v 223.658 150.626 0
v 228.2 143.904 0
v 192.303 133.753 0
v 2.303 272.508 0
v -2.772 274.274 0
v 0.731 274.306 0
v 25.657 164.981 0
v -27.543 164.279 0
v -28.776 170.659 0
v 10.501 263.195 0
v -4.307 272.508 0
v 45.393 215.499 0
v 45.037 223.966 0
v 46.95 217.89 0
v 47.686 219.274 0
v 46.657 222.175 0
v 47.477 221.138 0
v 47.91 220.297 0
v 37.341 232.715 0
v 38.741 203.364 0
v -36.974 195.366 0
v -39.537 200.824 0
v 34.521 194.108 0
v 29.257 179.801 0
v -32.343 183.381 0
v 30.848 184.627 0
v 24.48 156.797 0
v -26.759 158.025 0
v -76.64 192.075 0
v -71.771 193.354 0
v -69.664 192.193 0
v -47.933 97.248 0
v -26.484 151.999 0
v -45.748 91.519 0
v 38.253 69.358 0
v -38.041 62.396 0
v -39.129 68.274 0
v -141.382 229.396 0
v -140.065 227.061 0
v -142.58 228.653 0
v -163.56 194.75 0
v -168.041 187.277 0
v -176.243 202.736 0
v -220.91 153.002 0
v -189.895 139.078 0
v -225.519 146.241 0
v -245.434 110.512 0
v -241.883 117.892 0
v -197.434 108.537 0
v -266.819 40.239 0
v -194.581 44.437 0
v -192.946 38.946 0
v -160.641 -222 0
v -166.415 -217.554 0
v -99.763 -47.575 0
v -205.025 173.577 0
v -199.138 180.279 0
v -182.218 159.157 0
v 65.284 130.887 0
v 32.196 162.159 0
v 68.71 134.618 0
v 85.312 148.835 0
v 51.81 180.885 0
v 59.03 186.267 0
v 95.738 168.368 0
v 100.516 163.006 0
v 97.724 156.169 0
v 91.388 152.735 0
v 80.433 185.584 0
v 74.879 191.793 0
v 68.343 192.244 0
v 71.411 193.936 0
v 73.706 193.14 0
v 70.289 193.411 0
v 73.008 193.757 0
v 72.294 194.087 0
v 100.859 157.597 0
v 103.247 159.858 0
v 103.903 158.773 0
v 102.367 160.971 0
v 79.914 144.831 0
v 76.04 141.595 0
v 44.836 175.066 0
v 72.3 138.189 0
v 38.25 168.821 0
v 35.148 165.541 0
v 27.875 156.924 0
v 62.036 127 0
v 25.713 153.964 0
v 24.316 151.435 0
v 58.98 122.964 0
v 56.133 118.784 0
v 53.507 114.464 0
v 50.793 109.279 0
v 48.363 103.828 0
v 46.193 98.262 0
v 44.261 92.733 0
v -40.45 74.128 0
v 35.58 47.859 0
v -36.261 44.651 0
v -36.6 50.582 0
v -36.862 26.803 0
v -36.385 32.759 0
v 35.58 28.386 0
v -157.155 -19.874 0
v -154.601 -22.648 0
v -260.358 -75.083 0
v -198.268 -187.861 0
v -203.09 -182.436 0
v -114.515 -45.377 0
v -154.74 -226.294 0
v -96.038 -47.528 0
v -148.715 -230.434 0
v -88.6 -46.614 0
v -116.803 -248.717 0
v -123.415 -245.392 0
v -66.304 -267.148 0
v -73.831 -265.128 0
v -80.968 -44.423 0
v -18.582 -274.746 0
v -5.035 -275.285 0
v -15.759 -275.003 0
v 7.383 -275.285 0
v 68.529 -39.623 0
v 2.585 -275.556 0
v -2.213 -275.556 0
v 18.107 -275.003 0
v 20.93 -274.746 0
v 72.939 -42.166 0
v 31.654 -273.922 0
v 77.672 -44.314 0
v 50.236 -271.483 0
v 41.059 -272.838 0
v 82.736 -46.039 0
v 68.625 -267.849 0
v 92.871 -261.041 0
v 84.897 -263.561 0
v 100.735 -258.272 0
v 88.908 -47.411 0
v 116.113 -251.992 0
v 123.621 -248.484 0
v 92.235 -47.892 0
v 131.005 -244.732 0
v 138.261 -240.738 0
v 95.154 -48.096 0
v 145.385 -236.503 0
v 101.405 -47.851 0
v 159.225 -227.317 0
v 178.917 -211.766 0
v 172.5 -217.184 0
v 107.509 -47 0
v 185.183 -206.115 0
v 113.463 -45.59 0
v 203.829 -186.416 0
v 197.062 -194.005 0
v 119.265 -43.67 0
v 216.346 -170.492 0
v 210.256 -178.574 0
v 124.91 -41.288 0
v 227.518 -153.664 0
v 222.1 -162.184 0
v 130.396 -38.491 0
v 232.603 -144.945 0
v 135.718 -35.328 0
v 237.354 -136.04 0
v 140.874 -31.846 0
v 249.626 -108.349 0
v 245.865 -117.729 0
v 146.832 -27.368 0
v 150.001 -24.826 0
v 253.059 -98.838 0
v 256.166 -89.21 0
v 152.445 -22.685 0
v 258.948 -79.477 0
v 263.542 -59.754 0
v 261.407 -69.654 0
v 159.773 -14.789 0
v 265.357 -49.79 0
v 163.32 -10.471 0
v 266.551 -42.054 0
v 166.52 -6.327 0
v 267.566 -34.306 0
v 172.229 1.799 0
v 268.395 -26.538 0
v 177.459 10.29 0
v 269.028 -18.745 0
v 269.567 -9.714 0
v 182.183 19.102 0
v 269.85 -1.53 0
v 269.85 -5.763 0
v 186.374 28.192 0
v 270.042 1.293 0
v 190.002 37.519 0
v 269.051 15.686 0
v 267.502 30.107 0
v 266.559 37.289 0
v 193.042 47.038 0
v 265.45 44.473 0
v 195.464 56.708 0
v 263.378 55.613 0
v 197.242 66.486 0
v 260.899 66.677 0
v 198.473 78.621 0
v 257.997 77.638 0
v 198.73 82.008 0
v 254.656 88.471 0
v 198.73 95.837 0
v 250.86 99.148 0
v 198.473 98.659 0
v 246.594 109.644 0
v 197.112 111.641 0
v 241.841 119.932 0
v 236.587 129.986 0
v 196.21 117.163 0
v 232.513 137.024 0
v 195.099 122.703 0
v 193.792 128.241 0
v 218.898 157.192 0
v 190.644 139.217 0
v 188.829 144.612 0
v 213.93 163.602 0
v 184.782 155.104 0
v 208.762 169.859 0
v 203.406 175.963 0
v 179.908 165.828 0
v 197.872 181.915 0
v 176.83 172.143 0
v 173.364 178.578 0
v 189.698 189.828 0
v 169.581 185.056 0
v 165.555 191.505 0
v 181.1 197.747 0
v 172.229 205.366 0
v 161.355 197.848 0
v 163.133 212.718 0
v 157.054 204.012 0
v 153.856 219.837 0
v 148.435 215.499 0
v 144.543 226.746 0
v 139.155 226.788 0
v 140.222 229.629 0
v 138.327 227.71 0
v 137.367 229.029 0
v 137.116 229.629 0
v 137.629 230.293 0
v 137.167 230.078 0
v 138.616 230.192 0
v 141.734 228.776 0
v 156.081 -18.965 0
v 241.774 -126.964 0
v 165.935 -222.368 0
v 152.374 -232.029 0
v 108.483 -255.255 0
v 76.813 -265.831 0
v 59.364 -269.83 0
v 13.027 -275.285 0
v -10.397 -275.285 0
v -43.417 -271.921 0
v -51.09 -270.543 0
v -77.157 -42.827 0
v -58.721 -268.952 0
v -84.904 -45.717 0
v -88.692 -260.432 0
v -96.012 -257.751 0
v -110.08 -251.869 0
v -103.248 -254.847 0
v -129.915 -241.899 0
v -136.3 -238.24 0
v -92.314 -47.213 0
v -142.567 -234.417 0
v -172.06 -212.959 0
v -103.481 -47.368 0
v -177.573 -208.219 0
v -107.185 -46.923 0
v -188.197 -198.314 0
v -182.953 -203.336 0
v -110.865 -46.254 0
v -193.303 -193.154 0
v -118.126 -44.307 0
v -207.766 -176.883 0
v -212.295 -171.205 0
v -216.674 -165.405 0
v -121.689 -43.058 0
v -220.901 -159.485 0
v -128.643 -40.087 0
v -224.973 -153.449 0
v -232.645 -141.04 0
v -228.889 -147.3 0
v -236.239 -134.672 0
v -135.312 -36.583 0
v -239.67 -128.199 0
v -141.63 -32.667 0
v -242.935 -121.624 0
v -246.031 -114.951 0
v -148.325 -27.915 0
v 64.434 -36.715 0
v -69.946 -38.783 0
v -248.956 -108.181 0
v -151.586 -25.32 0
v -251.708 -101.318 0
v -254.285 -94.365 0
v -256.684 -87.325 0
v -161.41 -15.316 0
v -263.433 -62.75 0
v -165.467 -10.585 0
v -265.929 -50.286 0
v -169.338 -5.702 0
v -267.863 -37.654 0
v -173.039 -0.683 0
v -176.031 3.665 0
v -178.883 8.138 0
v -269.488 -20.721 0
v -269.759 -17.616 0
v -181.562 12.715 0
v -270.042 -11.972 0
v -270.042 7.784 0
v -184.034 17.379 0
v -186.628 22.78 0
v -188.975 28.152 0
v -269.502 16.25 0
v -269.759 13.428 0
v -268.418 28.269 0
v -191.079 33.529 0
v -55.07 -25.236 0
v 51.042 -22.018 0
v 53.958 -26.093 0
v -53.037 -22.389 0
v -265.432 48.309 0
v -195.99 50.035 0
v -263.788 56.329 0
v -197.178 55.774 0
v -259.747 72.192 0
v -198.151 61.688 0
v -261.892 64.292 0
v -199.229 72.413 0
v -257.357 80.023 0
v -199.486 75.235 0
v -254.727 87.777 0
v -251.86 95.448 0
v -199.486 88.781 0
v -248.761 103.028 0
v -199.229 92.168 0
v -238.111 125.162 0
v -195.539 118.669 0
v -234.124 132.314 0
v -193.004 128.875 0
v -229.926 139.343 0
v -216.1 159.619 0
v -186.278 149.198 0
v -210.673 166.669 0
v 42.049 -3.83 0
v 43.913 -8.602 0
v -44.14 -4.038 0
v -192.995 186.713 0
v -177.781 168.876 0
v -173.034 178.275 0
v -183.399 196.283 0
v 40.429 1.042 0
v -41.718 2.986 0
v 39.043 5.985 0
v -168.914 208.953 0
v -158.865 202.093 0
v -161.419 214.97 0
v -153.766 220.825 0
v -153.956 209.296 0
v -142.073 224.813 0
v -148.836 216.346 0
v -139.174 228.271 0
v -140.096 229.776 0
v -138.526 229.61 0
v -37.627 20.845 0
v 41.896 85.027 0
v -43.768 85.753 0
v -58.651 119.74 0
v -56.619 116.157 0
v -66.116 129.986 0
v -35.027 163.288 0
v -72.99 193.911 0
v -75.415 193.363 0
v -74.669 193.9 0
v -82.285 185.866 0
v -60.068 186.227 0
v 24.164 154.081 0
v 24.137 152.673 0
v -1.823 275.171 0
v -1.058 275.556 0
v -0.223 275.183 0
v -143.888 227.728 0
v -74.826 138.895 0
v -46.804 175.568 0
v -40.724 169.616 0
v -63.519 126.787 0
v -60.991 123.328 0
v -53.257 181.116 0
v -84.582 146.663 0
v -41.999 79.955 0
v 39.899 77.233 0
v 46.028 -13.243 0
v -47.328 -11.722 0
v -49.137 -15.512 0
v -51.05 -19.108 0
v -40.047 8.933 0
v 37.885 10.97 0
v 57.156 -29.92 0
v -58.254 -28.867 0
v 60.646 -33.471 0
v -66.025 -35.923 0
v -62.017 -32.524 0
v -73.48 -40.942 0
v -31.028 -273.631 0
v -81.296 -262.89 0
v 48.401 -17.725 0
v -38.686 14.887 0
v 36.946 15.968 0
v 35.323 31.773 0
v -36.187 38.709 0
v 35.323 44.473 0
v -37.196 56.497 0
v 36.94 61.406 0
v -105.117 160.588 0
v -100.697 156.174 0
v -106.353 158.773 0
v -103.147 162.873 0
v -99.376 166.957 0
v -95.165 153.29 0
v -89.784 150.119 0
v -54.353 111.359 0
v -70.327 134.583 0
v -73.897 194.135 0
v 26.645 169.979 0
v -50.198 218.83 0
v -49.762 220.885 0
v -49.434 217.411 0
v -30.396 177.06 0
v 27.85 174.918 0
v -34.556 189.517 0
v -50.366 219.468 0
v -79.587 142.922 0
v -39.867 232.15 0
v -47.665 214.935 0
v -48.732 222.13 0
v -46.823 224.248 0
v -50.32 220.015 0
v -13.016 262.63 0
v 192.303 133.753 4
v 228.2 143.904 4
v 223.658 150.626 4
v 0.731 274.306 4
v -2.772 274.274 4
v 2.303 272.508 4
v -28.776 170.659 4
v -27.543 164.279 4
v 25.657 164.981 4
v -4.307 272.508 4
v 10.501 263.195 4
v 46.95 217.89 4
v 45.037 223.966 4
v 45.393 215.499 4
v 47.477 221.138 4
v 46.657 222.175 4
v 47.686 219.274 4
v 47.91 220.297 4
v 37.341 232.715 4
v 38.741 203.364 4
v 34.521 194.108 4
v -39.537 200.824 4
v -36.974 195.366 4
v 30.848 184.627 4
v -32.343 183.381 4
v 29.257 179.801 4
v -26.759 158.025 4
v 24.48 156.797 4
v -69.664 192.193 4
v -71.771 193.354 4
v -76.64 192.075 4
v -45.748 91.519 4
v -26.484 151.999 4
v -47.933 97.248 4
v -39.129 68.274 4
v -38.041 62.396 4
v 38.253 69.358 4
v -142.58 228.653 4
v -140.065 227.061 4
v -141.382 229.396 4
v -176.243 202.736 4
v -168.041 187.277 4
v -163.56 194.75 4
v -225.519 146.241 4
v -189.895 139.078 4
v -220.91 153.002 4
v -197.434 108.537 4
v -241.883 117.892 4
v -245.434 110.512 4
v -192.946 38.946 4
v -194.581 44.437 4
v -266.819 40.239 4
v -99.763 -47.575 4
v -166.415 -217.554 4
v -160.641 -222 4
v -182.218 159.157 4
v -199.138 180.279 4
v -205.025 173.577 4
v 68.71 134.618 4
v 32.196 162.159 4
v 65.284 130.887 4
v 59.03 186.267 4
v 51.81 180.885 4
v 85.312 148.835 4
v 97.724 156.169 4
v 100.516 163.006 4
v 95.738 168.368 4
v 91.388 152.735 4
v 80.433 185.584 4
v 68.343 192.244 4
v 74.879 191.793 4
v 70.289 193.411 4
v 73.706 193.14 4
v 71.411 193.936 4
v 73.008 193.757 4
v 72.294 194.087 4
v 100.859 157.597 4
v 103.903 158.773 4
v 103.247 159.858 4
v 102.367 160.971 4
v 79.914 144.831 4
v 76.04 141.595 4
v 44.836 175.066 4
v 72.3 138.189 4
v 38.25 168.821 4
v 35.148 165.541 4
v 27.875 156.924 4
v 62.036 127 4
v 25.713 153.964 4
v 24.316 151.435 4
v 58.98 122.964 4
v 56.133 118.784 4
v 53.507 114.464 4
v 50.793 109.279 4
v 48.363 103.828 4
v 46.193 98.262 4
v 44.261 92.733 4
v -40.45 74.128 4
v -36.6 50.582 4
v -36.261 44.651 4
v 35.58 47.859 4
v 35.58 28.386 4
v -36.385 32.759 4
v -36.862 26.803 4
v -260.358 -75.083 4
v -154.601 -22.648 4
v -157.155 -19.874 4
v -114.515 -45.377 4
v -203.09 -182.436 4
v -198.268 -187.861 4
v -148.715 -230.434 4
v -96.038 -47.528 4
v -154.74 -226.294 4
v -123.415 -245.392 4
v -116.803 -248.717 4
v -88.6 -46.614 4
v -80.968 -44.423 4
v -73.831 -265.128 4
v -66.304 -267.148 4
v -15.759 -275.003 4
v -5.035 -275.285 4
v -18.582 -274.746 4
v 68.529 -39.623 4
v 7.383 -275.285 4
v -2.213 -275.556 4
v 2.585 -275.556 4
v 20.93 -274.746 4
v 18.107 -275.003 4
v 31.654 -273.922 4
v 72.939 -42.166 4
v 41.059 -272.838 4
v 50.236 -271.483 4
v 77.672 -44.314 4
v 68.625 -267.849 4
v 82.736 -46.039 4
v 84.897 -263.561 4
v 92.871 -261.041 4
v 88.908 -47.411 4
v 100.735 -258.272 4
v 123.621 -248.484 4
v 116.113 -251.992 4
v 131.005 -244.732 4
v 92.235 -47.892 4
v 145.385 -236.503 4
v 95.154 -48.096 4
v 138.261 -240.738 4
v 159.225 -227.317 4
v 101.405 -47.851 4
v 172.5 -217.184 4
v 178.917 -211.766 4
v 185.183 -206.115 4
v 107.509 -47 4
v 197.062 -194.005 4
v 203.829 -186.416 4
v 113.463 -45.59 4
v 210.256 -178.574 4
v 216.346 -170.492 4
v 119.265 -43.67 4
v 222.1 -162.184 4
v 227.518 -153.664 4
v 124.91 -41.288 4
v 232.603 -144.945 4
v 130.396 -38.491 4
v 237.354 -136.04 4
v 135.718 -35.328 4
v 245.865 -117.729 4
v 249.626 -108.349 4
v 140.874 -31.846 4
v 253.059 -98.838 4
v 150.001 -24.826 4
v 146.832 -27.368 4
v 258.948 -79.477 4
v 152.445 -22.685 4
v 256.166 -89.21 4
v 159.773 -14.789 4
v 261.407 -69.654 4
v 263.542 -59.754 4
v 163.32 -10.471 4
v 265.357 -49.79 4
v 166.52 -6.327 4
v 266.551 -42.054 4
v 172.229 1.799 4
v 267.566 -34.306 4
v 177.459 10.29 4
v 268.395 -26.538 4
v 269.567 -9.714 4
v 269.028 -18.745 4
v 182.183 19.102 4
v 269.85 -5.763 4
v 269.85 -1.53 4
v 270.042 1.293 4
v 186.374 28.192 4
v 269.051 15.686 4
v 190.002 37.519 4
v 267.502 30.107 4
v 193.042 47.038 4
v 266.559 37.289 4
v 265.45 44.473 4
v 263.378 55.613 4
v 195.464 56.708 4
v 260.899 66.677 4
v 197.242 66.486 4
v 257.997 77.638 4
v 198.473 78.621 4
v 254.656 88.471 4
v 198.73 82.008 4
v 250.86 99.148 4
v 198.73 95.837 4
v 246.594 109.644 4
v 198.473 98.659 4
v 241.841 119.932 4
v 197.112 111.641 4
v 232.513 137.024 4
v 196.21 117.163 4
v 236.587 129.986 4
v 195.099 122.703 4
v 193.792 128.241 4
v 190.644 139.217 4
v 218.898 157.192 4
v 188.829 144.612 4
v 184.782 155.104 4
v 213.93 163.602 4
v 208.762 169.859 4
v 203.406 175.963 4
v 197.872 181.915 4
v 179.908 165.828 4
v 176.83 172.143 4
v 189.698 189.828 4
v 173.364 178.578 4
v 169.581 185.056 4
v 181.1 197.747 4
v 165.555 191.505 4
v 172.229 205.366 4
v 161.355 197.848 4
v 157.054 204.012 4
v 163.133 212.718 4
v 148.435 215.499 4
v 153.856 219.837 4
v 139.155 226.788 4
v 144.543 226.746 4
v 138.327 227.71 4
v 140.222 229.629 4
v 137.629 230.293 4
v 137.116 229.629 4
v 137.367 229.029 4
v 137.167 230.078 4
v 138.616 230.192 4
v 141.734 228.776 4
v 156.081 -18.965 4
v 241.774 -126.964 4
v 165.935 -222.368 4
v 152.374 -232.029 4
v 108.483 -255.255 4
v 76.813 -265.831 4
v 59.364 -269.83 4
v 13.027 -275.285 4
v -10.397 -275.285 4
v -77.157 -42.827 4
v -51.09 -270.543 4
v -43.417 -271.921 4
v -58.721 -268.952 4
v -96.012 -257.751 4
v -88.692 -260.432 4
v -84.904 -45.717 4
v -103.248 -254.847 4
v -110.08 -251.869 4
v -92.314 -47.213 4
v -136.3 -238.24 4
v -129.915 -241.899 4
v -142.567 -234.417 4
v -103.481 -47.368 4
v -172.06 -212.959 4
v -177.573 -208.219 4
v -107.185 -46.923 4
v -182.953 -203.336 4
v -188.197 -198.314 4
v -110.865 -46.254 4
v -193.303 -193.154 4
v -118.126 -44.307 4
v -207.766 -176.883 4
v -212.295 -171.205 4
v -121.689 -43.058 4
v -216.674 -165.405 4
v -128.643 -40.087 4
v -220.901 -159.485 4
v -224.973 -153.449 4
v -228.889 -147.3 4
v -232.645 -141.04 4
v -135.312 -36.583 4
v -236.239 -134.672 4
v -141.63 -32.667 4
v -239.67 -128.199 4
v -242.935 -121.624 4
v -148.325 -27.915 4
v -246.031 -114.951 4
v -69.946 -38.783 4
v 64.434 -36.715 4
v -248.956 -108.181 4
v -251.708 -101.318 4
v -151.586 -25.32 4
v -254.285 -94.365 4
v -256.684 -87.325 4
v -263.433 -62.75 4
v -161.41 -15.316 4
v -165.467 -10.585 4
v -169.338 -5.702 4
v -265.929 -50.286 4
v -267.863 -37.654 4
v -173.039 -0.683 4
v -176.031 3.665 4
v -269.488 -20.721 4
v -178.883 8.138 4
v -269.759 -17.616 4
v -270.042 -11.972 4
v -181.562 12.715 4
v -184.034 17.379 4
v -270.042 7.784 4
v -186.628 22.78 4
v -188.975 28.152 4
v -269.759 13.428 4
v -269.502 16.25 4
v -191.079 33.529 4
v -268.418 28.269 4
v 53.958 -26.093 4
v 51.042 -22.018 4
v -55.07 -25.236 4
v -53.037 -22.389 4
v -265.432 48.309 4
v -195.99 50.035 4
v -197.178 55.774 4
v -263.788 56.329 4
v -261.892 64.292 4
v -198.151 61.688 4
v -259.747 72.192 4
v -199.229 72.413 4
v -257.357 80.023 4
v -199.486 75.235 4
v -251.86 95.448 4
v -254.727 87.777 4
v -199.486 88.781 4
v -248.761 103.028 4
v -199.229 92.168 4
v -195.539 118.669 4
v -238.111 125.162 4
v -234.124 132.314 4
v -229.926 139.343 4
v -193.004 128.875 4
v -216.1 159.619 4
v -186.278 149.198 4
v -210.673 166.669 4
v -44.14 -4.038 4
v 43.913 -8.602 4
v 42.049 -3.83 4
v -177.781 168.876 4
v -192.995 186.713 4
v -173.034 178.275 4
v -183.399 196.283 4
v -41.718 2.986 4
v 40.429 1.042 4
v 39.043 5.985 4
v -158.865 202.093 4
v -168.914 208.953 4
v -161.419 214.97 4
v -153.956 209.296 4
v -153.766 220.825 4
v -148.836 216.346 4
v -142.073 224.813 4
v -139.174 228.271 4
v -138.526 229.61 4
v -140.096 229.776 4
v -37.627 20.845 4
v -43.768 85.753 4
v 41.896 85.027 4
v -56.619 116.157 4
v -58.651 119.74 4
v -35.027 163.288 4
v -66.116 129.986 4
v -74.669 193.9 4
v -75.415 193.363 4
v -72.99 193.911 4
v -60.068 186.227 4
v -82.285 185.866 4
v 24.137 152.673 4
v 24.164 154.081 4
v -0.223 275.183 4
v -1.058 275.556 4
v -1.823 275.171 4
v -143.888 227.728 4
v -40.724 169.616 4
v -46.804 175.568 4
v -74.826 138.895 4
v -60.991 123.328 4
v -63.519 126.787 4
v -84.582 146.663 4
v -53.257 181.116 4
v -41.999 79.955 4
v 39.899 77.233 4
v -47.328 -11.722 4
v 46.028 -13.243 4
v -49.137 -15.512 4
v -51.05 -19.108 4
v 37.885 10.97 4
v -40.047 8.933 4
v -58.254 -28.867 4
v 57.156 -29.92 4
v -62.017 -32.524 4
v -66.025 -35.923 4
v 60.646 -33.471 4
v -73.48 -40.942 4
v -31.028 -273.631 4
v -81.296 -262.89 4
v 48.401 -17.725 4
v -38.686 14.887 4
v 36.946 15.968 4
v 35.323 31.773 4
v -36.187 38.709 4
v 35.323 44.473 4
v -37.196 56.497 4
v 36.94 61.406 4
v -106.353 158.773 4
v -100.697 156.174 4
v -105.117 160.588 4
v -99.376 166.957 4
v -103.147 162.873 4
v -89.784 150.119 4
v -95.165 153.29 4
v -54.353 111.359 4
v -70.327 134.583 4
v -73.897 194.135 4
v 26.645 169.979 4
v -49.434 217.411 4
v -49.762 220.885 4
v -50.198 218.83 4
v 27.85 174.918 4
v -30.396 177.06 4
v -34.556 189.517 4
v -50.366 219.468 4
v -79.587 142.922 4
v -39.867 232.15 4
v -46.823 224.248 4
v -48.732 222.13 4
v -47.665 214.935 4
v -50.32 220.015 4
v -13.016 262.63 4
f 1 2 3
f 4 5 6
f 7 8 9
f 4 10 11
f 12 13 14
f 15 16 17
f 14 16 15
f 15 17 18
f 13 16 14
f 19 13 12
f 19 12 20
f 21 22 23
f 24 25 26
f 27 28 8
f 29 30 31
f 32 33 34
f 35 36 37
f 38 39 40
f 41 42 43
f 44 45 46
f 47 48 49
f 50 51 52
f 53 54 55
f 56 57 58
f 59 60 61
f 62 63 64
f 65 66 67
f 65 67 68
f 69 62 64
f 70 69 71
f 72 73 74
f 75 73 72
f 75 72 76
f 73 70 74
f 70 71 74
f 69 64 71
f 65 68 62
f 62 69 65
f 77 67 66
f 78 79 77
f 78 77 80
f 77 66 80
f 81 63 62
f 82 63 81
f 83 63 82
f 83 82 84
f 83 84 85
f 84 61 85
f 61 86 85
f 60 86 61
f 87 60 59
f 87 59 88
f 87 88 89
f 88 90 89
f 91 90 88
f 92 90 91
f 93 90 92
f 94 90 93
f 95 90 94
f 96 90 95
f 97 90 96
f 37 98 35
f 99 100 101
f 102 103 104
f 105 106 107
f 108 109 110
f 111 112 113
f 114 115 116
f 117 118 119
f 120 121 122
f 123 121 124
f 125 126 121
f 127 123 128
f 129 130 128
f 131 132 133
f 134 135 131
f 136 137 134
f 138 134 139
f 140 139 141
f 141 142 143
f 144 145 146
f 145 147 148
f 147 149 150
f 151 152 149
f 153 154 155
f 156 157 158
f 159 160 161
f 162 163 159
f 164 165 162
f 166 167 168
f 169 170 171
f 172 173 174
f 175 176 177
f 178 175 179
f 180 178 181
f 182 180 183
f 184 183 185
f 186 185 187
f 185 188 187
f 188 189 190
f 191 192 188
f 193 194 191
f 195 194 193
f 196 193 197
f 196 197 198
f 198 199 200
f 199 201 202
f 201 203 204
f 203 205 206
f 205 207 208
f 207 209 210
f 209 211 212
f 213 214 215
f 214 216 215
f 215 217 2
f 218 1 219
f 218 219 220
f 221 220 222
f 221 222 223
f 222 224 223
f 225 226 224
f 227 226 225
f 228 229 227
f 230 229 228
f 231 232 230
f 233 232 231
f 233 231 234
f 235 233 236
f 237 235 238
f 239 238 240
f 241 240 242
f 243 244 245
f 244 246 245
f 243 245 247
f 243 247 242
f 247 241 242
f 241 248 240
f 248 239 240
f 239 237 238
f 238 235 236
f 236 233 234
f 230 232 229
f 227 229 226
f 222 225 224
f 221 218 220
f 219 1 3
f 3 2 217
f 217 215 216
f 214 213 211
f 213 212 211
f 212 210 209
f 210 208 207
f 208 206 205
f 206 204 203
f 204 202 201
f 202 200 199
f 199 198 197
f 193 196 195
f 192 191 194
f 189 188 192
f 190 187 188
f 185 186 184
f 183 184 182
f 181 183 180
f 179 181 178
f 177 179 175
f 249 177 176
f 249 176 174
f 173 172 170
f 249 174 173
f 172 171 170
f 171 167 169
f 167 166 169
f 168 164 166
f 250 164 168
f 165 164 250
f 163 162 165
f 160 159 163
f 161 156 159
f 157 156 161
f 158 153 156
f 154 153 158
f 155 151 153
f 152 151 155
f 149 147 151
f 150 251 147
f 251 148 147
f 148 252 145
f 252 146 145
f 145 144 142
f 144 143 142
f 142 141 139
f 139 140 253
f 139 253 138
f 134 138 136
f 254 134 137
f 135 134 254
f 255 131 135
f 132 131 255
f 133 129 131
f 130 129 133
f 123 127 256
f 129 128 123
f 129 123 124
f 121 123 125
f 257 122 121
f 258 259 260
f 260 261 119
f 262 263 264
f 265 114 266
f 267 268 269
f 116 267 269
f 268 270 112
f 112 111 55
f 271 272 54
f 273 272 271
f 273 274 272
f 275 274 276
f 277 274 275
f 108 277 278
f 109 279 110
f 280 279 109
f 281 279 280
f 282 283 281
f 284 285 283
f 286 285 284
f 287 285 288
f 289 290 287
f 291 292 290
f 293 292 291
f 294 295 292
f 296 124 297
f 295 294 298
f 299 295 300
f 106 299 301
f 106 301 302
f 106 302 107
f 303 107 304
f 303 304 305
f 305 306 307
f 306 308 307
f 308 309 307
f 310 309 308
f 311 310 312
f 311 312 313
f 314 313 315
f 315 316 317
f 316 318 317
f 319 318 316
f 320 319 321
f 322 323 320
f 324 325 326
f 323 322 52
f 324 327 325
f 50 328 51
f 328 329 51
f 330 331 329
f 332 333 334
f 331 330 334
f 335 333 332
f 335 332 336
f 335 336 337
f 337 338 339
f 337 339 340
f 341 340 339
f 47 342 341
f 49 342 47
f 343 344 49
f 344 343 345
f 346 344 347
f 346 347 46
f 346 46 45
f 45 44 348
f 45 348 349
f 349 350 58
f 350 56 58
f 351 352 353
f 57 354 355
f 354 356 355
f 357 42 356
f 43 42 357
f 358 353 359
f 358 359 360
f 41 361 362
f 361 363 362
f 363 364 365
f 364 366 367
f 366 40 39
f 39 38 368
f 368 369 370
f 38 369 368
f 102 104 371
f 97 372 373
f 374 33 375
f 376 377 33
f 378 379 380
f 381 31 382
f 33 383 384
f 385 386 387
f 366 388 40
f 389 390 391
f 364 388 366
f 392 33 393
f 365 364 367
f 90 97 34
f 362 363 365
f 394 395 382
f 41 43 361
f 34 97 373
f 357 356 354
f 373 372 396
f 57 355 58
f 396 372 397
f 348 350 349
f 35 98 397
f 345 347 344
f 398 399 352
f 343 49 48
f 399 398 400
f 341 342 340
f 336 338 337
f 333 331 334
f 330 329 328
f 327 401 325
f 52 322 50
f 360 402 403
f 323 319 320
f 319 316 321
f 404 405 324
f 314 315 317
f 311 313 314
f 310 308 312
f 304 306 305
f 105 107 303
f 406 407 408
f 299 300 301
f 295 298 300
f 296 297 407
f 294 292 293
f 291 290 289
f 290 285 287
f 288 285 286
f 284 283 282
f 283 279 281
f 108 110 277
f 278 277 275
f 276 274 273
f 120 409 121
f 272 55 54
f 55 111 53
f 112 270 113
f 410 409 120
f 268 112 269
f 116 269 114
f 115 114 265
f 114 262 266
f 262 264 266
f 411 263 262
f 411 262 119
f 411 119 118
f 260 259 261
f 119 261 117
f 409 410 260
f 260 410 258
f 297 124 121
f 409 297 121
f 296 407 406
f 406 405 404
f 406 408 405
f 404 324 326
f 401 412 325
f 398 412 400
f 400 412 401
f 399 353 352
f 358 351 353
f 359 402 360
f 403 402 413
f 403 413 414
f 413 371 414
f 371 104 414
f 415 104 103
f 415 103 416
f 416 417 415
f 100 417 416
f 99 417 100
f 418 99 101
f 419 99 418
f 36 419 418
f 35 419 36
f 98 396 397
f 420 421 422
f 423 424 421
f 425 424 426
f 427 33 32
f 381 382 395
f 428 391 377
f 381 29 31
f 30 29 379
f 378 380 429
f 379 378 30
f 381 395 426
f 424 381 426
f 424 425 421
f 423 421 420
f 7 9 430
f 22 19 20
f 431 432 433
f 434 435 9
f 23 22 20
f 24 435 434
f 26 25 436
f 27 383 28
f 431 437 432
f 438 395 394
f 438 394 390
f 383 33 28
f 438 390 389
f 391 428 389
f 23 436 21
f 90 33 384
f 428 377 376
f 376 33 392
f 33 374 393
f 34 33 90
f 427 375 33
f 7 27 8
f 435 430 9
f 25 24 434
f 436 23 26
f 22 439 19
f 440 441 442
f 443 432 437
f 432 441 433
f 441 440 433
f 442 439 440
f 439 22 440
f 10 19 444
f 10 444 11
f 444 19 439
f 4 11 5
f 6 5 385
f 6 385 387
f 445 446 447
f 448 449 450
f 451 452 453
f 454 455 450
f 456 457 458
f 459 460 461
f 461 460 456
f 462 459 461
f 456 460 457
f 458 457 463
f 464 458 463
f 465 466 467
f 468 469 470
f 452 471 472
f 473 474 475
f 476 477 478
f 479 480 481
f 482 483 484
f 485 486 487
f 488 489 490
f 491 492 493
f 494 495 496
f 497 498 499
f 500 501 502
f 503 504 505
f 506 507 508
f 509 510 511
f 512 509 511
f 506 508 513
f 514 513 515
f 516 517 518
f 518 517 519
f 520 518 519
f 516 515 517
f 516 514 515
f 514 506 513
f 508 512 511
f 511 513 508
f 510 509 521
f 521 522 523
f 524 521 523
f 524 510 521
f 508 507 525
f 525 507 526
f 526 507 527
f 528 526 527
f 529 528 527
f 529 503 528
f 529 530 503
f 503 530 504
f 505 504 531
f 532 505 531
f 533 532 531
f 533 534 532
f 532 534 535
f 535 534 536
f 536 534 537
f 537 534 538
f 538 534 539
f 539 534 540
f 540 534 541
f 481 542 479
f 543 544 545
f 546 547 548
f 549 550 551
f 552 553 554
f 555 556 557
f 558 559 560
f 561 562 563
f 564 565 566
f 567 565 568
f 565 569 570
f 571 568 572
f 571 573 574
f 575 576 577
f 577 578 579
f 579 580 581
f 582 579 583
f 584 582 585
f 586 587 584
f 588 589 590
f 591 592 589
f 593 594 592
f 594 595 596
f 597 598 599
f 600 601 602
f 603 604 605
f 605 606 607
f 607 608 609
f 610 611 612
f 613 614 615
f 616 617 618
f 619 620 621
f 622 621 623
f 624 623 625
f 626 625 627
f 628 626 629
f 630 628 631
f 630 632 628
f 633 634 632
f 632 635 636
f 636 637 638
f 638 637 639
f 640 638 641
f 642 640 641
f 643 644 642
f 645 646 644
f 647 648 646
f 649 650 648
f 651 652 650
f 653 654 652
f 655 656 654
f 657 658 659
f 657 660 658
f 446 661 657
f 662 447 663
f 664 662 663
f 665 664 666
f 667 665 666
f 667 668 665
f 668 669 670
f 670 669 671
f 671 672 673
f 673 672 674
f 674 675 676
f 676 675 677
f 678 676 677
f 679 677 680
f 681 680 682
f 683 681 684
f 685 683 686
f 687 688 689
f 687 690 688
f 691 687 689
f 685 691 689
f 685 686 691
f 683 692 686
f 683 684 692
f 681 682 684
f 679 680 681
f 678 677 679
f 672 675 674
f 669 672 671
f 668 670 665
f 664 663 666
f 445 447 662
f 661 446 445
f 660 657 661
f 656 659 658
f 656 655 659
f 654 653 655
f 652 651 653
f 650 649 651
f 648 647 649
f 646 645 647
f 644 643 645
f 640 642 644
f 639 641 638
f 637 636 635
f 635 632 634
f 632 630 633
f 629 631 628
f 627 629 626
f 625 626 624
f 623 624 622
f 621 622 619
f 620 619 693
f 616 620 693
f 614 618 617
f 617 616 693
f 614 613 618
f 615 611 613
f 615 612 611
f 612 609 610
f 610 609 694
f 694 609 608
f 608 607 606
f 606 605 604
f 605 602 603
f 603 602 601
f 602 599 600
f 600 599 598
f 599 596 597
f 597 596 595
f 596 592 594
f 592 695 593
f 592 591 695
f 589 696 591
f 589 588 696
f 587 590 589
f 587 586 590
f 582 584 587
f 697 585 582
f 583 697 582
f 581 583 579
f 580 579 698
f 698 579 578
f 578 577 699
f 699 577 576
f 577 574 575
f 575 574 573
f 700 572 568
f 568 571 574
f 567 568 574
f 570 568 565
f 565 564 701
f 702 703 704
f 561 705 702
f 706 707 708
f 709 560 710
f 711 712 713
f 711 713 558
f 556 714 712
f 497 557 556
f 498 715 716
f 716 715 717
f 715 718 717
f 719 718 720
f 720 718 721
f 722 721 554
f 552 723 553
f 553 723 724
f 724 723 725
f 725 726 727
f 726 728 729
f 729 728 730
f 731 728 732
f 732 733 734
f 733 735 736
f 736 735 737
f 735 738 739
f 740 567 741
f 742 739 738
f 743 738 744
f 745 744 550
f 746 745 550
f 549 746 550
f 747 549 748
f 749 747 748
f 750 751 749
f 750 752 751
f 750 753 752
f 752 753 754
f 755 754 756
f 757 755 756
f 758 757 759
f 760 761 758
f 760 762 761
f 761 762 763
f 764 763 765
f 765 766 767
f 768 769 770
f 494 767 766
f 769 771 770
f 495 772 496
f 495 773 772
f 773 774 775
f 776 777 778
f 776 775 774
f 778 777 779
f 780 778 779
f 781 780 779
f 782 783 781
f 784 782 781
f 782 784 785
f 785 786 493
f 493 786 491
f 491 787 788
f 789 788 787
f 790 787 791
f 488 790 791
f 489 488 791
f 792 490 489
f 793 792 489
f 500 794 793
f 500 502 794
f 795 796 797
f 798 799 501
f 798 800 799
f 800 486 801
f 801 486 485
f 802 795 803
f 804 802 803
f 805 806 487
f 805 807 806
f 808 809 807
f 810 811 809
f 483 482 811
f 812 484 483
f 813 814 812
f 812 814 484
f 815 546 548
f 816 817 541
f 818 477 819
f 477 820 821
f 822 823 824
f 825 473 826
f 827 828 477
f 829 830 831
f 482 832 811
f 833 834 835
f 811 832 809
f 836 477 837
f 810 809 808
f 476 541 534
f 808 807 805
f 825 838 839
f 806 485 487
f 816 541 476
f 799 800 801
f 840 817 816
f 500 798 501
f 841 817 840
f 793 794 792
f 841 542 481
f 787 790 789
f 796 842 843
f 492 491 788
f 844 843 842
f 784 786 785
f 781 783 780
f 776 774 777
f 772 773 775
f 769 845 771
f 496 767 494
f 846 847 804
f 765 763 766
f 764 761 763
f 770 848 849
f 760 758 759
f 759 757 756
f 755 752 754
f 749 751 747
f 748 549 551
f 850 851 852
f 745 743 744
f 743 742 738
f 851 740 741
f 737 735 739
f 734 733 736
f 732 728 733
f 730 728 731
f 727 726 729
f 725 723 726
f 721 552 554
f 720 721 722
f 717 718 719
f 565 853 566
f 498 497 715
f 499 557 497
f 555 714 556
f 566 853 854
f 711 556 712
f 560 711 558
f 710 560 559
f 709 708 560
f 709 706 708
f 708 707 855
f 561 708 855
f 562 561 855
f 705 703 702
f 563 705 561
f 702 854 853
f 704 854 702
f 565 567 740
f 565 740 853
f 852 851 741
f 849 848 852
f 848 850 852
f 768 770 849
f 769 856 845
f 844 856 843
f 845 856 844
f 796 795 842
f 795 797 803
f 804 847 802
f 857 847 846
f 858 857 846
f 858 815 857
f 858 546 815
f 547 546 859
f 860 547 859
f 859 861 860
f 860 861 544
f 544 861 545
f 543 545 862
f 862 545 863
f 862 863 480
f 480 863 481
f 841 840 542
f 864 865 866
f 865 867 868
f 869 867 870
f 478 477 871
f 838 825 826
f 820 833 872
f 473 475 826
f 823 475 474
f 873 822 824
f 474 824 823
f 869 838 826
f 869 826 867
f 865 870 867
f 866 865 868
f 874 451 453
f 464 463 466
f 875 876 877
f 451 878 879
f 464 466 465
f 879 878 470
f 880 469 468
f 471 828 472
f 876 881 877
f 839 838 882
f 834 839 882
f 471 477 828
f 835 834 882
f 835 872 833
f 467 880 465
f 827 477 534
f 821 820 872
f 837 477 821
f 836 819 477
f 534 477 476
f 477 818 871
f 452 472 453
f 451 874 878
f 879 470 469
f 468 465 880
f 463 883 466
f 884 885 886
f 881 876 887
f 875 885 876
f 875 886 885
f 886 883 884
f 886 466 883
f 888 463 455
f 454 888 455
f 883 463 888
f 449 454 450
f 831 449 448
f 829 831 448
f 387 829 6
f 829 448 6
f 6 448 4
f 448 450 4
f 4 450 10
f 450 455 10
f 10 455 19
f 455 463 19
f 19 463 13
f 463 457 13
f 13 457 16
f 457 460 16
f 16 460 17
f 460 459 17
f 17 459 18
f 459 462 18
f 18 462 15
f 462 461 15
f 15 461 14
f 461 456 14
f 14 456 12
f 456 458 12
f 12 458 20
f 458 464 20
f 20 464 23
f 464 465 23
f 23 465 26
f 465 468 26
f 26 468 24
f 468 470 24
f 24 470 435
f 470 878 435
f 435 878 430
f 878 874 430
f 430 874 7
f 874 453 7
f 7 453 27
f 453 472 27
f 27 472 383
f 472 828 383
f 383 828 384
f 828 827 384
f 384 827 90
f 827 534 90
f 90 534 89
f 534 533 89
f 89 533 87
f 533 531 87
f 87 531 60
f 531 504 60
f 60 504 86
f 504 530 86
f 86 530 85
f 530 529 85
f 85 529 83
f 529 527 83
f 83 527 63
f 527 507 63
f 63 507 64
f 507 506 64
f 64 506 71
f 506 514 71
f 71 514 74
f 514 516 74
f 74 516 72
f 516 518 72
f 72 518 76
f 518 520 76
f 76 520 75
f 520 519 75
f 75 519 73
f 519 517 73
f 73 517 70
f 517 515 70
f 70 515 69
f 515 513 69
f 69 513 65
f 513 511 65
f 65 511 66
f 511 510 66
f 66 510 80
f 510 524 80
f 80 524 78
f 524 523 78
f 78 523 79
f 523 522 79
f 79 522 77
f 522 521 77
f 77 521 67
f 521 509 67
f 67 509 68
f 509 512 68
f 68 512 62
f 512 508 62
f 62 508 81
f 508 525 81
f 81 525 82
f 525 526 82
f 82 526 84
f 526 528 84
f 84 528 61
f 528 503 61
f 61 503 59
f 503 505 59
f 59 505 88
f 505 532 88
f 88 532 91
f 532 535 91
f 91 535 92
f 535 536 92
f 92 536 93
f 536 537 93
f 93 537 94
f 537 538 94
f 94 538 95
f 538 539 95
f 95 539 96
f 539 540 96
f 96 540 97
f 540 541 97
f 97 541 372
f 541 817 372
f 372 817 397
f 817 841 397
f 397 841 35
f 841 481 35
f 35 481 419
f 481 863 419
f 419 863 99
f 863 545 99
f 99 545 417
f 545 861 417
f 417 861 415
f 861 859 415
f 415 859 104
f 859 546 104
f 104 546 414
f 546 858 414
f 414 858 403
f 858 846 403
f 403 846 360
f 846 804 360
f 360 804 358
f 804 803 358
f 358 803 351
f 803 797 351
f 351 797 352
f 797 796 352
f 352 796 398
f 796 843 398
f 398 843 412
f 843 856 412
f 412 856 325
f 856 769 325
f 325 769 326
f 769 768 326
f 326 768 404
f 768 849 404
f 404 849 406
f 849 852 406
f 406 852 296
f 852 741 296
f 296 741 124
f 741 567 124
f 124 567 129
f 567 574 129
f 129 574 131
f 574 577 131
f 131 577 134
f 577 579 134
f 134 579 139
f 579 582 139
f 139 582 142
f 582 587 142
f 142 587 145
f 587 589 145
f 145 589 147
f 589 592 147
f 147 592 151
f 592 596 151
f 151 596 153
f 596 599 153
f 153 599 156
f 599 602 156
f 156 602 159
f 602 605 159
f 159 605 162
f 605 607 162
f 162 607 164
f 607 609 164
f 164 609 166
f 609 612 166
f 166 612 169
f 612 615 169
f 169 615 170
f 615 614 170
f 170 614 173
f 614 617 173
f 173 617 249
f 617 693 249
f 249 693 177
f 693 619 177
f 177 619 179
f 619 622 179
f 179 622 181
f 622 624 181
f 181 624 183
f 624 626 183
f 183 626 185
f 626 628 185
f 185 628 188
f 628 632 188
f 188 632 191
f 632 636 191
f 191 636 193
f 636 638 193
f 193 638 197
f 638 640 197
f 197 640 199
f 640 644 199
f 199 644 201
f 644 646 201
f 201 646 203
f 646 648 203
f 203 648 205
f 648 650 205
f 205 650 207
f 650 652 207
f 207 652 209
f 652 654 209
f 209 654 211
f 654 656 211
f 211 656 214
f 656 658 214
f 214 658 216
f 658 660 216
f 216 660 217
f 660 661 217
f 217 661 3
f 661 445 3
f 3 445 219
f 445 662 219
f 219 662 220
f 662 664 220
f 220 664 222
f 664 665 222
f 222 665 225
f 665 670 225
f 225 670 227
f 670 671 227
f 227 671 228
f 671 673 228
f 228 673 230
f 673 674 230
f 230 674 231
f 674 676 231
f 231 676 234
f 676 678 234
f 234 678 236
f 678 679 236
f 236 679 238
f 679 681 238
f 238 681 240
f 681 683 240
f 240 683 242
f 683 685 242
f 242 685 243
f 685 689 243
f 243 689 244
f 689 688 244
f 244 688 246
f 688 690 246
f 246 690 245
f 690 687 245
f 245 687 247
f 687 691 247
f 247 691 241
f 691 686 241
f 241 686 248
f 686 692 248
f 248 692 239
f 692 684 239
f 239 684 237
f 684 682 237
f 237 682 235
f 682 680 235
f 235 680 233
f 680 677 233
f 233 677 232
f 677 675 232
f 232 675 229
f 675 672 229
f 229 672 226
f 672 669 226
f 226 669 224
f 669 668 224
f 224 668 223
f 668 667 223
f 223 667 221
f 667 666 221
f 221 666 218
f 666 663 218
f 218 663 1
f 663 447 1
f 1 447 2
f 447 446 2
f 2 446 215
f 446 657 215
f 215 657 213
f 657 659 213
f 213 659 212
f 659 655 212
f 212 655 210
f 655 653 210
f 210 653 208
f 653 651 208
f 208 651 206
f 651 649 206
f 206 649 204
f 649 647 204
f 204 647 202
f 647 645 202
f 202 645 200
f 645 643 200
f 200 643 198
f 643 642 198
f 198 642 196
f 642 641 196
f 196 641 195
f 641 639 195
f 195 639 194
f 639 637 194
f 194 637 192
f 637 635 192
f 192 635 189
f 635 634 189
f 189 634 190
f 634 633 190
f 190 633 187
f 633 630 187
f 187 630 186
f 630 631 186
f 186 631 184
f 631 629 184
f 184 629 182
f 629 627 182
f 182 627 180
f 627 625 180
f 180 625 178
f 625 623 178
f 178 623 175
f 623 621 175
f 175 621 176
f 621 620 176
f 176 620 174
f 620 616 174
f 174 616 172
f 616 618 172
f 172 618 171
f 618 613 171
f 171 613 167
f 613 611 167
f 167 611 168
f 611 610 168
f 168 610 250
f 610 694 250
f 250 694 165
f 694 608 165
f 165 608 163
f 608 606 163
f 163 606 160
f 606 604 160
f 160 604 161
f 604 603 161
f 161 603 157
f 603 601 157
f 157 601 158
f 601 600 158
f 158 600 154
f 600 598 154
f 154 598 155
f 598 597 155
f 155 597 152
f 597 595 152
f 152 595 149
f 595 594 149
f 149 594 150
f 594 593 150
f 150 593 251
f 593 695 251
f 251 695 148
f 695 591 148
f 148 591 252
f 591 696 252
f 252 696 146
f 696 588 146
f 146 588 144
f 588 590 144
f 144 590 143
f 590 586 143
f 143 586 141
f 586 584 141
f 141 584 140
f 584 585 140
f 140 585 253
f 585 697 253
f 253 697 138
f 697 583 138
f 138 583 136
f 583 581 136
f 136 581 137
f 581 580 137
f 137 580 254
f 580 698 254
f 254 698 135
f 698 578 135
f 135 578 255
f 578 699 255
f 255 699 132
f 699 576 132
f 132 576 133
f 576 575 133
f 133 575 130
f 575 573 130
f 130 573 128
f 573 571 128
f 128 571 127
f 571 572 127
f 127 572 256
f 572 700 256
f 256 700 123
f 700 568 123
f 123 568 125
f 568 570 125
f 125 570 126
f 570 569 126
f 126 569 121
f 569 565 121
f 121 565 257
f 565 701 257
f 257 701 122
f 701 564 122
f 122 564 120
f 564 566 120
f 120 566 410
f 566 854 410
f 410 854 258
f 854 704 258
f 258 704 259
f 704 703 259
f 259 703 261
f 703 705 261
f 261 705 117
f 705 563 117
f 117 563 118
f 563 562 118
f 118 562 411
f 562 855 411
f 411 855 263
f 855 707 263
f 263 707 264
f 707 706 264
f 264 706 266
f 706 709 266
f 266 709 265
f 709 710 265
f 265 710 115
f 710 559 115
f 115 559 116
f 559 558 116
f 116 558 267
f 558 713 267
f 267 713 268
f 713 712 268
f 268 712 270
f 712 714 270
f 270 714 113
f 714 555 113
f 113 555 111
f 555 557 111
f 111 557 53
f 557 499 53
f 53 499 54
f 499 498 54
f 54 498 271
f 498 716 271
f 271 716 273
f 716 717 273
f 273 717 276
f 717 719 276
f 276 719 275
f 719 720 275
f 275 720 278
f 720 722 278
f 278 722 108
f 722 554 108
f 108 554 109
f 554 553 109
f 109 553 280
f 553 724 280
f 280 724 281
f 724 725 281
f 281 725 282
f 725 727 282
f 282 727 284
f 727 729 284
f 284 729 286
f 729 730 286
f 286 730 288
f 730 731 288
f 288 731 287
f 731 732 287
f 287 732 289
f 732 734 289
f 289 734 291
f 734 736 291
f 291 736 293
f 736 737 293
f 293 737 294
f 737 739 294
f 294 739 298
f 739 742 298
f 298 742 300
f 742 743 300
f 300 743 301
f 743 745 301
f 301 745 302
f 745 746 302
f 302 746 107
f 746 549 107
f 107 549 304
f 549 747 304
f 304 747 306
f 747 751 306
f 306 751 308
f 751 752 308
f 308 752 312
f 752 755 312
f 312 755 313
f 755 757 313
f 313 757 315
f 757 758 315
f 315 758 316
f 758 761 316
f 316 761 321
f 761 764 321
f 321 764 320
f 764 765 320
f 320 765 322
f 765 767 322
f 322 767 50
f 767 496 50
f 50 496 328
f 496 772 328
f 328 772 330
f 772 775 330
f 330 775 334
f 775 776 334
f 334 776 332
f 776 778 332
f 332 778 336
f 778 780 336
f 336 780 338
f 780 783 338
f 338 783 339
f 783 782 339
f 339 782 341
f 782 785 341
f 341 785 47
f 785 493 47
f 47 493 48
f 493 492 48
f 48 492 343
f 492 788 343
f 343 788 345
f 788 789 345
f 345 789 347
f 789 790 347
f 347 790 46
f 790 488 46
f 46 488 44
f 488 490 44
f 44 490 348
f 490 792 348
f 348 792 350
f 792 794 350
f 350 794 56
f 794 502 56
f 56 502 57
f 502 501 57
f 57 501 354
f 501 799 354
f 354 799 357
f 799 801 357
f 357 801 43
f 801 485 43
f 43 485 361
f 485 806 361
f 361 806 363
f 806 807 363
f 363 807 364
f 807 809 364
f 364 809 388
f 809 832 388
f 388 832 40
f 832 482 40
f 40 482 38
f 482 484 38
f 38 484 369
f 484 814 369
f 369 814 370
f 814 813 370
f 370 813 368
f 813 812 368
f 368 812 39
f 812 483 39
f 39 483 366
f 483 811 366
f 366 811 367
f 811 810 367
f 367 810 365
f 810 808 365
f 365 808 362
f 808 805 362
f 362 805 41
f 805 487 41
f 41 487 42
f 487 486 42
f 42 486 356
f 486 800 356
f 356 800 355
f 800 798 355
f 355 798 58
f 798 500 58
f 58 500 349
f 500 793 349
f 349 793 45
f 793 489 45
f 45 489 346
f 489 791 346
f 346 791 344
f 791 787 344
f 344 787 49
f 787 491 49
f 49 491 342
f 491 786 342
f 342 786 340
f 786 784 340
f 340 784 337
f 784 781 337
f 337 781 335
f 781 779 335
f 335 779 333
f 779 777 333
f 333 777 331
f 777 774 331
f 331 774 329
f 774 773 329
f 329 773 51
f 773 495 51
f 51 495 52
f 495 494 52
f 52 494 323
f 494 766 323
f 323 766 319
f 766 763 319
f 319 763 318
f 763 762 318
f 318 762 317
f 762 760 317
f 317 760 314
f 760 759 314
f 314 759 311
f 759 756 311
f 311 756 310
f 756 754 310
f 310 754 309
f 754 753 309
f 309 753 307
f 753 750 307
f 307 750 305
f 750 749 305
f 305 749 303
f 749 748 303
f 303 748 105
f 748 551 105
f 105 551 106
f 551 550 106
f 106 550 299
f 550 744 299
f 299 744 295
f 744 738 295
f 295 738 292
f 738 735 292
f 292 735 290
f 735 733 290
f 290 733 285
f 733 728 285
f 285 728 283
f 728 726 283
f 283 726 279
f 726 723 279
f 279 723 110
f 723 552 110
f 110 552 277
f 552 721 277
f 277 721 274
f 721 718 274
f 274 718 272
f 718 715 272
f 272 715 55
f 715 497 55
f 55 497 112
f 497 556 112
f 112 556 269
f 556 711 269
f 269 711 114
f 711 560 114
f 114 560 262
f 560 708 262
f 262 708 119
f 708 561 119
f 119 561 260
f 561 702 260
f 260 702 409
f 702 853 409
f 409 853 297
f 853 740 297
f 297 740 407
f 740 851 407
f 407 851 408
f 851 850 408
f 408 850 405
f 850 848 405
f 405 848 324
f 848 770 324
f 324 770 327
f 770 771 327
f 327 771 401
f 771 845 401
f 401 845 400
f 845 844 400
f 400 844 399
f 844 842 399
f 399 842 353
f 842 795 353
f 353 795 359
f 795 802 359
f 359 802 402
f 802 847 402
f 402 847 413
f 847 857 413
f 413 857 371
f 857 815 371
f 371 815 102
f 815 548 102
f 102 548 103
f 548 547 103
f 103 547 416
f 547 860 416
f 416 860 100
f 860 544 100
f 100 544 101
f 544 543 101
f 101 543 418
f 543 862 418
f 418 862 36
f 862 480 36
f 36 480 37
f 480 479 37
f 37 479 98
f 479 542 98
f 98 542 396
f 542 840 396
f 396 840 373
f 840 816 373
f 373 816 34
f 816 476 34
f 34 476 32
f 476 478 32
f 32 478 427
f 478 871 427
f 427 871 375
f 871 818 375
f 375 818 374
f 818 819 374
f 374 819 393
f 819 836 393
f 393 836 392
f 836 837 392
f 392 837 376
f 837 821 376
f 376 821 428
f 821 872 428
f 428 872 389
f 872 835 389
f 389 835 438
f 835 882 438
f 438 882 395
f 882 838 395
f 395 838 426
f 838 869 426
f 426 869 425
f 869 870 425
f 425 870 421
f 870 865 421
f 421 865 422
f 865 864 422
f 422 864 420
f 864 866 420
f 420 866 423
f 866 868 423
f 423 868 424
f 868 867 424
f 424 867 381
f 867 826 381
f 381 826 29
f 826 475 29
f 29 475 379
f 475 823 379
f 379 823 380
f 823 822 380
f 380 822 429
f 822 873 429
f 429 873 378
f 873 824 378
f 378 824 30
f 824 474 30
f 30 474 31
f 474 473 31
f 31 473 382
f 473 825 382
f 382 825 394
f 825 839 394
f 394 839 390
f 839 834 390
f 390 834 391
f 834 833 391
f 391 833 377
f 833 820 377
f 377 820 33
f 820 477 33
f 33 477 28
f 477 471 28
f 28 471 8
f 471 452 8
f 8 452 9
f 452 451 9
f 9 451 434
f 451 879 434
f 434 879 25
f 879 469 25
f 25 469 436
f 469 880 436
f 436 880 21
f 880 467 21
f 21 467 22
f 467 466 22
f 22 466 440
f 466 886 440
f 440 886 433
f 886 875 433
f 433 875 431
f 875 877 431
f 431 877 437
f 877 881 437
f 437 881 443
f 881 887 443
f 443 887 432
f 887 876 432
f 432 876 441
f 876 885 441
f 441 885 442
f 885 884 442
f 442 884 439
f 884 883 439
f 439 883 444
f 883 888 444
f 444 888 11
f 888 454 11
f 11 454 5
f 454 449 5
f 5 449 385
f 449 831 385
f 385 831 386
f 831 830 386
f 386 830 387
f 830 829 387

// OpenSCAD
// Module names are of the form poly_<inkscape-path-id>().  As a result,
// you can associate a polygon in this OpenSCAD program with the corresponding
// SVG element in the Inkscape document by looking for the XML element with
// the attribute id="inkscape-path-id".

// fudge value is used to ensure that subtracted solids are a tad taller
// in the z dimension than the polygon being subtracted from.  This helps
// keep the resulting .stl file manifold.
fudge = 0.1;

module poly_Selection(h)
{
  scale([25.4/90, -25.4/90, 1]) union()
  {
    linear_extrude(height=h)
      polygon([[-140.090000,-711.580000],[-168.890000,-761.580000],[-175.158750,-770.355000],[-177.866094,-775.380938],[-178.460449,-777.642539],[-178.300000,-779.580000],[-176.323281,-782.664844],[-172.671250,-787.076250],[-165.910000,-794.580000],[-141.260000,-822.580000],[-46.120000,-930.580000],[-15.260000,-965.580000],[-9.823750,-971.838750],[-6.461094,-975.014531],[-3.750000,-976.380000],[-0.790781,-975.056719],[2.591250,-971.951250],[8.160000,-965.580000],[37.210000,-932.580000],[132.310000,-824.580000],[159.580000,-793.580000],[165.318750,-787.233750],[168.227031,-783.560469],[169.760000,-780.580000],[168.965313,-776.953438],[166.357500,-772.050000],[160.840000,-763.580000],[137.270000,-720.580000],[122.320000,-687.783281],[109.305000,-654.188750],[103.666094,-637.090254],[98.682500,-619.789844],[94.411406,-602.286699],[90.910000,-584.580000],[86.740000,-555.580000],[85.621250,-545.956250],[85.526406,-540.967656],[86.160000,-536.580000],[91.107500,-545.540938],[98.770000,-556.030000],[114.080000,-574.580000],[124.538477,-586.564258],[135.531562,-598.184063],[158.867500,-620.312500],[183.579687,-640.929688],[209.160000,-660.000000],[242.160000,-681.180000],[249.055000,-685.315000],[253.030312,-687.173438],[256.160000,-687.710000],[258.689531,-686.539531],[261.163750,-684.353750],[265.320000,-679.580000],[285.000000,-657.580000],[339.230000,-596.580000],[356.160000,-577.580000],[362.718750,-570.368750],[365.836406,-566.427031],[368.160000,-562.580000],[357.375859,-558.414766],[346.266875,-553.353750],[323.815000,-541.187500],[302.285625,-527.367500],[283.160000,-513.180000],[269.431836,-501.715566],[256.181563,-489.647031],[243.460508,-476.992793],[231.320000,-463.771250],[219.811367,-450.000801],[208.985937,-435.699844],[198.895039,-420.886777],[189.590000,-405.580000],[179.976875,-387.207969],[171.365000,-367.893750],[163.675625,-348.172656],[156.830000,-328.580000],[148.449844,-301.275781],[141.373750,-273.661250],[135.540781,-245.756094],[130.890000,-217.580000],[126.070000,-169.580000],[125.160000,-157.580000],[125.160000,-112.580000],[126.070000,-100.580000],[130.910000,-56.580000],[134.238149,-38.871221],[138.342695,-21.206797],[143.251909,-3.690850],[148.994063,13.572500],[155.597427,30.479131],[163.090273,46.924922],[171.500874,62.805752],[180.857500,78.017500],[191.188423,92.456045],[202.521914,106.017266],[214.886245,118.597041],[228.309688,130.091250],[242.820513,140.395771],[258.446992,149.406484],[275.217397,157.019268],[293.160000,163.130000],[315.028750,167.990000],[326.818594,169.694375],[337.160000,170.420000],[359.307383,169.551621],[380.936562,166.534844],[402.035586,161.539707],[422.592500,154.736250],[442.595352,146.294512],[462.032188,136.384531],[480.891055,125.176348],[499.160000,112.840000],[520.271250,96.973750],[531.499531,87.964844],[540.160000,80.380000],[553.044219,67.199219],[566.126250,52.401250],[578.692656,37.102656],[590.030000,22.420000],[610.259473,-6.374434],[628.792656,-36.459219],[645.531699,-67.682832],[660.378750,-99.893750],[673.235957,-132.940449],[684.005469,-166.671406],[692.589434,-200.935098],[698.890000,-235.580000],[703.250000,-278.580000],[704.160000,-290.580000],[704.160000,-339.580000],[703.250000,-349.580000],[698.430000,-395.580000],[695.232402,-415.143770],[691.295469,-434.775156],[686.665488,-454.395527],[681.388750,-473.926250],[675.511543,-493.288691],[669.080156,-512.404219],[654.740000,-549.580000],[637.470000,-587.580000],[626.562285,-609.956113],[614.280781,-632.755156],[600.879199,-655.711934],[586.611250,-678.561250],[571.730645,-701.037910],[556.491094,-722.876719],[525.950000,-763.580000],[493.070000,-803.580000],[490.134844,-806.846719],[486.733750,-811.518750],[485.844902,-813.644355],[486.023281,-815.236406],[487.663457,-815.999941],[491.160000,-815.640000],[496.848750,-813.647813],[502.207500,-810.622500],[512.160000,-803.430000],[545.160000,-778.950000],[578.029844,-753.726875],[610.261250,-727.675000],[641.692031,-700.678125],[672.160000,-672.620000],[701.120000,-644.580000],[720.731309,-623.489277],[739.709219,-601.861719],[758.018457,-579.692988],[775.623750,-556.978750],[792.489824,-533.714668],[808.581406,-509.896406],[823.863223,-485.519629],[838.300000,-460.580000],[856.918223,-424.955527],[873.757656,-388.501719],[888.874199,-351.311738],[902.323750,-313.478750],[914.162207,-275.095918],[924.445469,-236.256406],[933.229434,-197.053379],[940.570000,-157.580000],[944.501562,-132.125000],[947.842500,-106.677500],[953.330000,-55.580000],[956.840000,-4.580000],[956.160000,5.420000],[956.160000,20.420000],[955.160000,34.420000],[953.250000,66.420000],[951.004844,94.030625],[948.068750,121.555000],[944.470781,149.011875],[940.240000,176.420000],[933.811047,211.725286],[926.243691,246.805410],[917.533435,281.612400],[907.675781,316.098281],[896.666233,350.215081],[884.500293,383.914824],[871.173464,417.149539],[856.681250,449.871250],[841.019153,482.031985],[824.182676,513.583770],[806.167322,544.478630],[786.968594,574.668594],[766.581995,604.105686],[745.003027,632.741934],[722.227195,660.529363],[698.250000,687.420000],[656.160000,730.330000],[633.958083,750.351604],[611.220137,769.549395],[587.957864,787.918464],[564.182969,805.453906],[539.907156,822.150813],[515.142129,838.004277],[489.899592,853.009392],[464.191250,867.161250],[438.028806,880.454944],[411.423965,892.885566],[384.388430,904.448210],[356.933906,915.137969],[329.072097,924.949934],[300.814707,933.879199],[272.173440,941.920857],[243.160000,949.070000],[210.345781,956.090156],[178.001250,961.948750],[145.486094,966.747969],[112.160000,970.590000],[74.160000,973.510000],[64.160000,974.420000],[46.160000,975.420000],[26.160000,975.420000],[9.160000,976.380000],[-7.840000,976.380000],[-17.840000,975.420000],[-36.840000,975.420000],[-55.840000,974.420000],[-65.840000,973.510000],[-109.941250,969.558750],[-153.840000,963.500000],[-181.026191,958.615820],[-208.065781,952.980938],[-234.934043,946.588086],[-261.606250,939.430000],[-288.057676,931.499414],[-314.263594,922.789062],[-340.199277,913.291680],[-365.840000,903.000000],[-390.045730,892.449340],[-413.868069,881.279253],[-437.298800,869.500076],[-460.329707,857.122148],[-482.952575,844.155807],[-505.159187,830.611392],[-526.941328,816.499239],[-548.290781,801.829687],[-569.199331,786.613076],[-589.658762,770.859741],[-609.660858,754.580023],[-629.197402,737.784258],[-648.260180,720.482785],[-666.840974,702.685942],[-684.931570,684.404068],[-702.523750,665.647500],[-719.609300,646.426577],[-736.180002,626.751636],[-752.227643,606.633016],[-767.744004,586.081055],[-782.720871,565.106091],[-797.150027,543.718462],[-811.023257,521.928506],[-824.332344,499.746562],[-837.069073,477.182968],[-849.225227,454.248062],[-860.792591,430.952181],[-871.762949,407.305664],[-882.128085,383.318849],[-891.879783,359.002075],[-901.009826,334.365679],[-909.510000,309.420000],[-922.527812,266.043437],[-933.425000,222.342500],[-942.267188,178.180313],[-949.120000,133.420000],[-954.880000,73.420000],[-955.840000,62.420000],[-956.840000,42.420000],[-956.840000,-27.580000],[-955.840000,-47.580000],[-954.930000,-57.580000],[-951.086250,-100.166250],[-945.420000,-142.580000],[-940.506765,-171.172578],[-934.683027,-199.589375],[-927.963362,-227.806484],[-920.362344,-255.800000],[-911.894548,-283.546016],[-902.574551,-311.020625],[-892.416926,-338.199922],[-881.436250,-365.060000],[-869.647097,-391.576953],[-857.064043,-417.726875],[-843.701663,-443.485859],[-829.574531,-468.830000],[-814.697224,-493.735391],[-799.084316,-518.178125],[-782.750383,-542.134297],[-765.710000,-565.580000],[-746.478594,-590.558750],[-726.466250,-615.035000],[-705.608281,-638.783750],[-683.840000,-661.580000],[-649.840000,-695.490000],[-624.482969,-718.357344],[-598.513750,-740.383750],[-571.957656,-761.703281],[-544.840000,-782.450000],[-509.840000,-806.910000],[-505.204844,-810.186719],[-500.958750,-812.821250],[-496.403281,-814.167656],[-490.840000,-813.580000],[-493.135937,-808.834063],[-496.292500,-804.547500],[-503.410000,-796.580000],[-527.370000,-766.580000],[-545.513594,-741.598750],[-562.906250,-716.077500],[-579.543281,-690.057500],[-595.420000,-663.580000],[-613.111660,-631.683555],[-629.933906,-598.377813],[-645.653887,-563.941914],[-660.038750,-528.655000],[-672.855645,-492.796211],[-683.871719,-456.644688],[-692.854121,-420.479570],[-699.570000,-384.580000],[-705.930000,-326.580000],[-706.840000,-314.580000],[-706.840000,-266.580000],[-705.930000,-256.580000],[-702.110000,-218.580000],[-698.663379,-197.623223],[-694.453281,-177.287656],[-689.460605,-157.452949],[-683.666250,-137.998750],[-677.051113,-118.804707],[-669.596094,-99.750469],[-661.282090,-80.715684],[-652.090000,-61.580000],[-643.329219,-45.053594],[-633.836250,-28.833750],[-623.730156,-12.987031],[-613.130000,2.420000],[-600.017656,20.202812],[-586.298750,37.507500],[-571.925469,54.268438],[-556.850000,70.420000],[-547.800000,80.250000],[-537.114375,89.716094],[-525.562500,98.911250],[-501.840000,115.750000],[-479.450332,129.625664],[-455.821406,142.040937],[-431.182090,152.569492],[-418.555056,156.993022],[-405.761250,160.785000],[-392.829280,163.892134],[-379.787754,166.261133],[-366.665281,167.838706],[-353.490469,168.571562],[-340.291926,168.406411],[-327.098262,167.289961],[-313.938083,165.168921],[-300.840000,161.990000],[-286.895781,157.404219],[-273.391250,151.748750],[-260.361094,145.071406],[-247.840000,137.420000],[-233.948125,127.287500],[-219.745000,115.242500],[-206.411875,102.286250],[-195.130000,89.420000],[-187.927129,79.332539],[-180.885156,67.705938],[-174.107793,54.965117],[-167.698750,41.535000],[-156.400469,14.306563],[-147.820000,-10.580000],[-141.899351,-31.653450],[-137.075898,-52.750410],[-133.323013,-73.860173],[-130.614063,-94.972031],[-128.922417,-116.075276],[-128.221445,-137.159199],[-128.484517,-158.213093],[-129.685000,-179.226250],[-131.796265,-200.187961],[-134.791680,-221.087520],[-138.644614,-241.914216],[-143.328438,-262.657344],[-148.816519,-283.306194],[-155.082227,-303.850059],[-162.098931,-324.278230],[-169.840000,-344.580000],[-192.590000,-394.580000],[-200.620000,-411.580000],[-207.818438,-424.276250],[-216.110000,-436.987500],[-225.069063,-449.245000],[-234.270000,-460.580000],[-249.188574,-476.868008],[-265.131719,-492.146563],[-282.001816,-506.414961],[-299.701250,-519.672500],[-318.132402,-531.918477],[-337.197656,-543.152188],[-356.799395,-553.372930],[-376.840000,-562.580000],[-372.461406,-569.012500],[-365.481250,-577.110000],[-352.120000,-591.580000],[-291.560000,-658.580000],[-271.560000,-680.580000],[-267.217500,-685.145000],[-264.576563,-687.048750],[-261.840000,-687.880000],[-258.625781,-687.084844],[-254.306250,-685.111250],[-246.840000,-681.000000],[-212.840000,-659.860000],[-188.704687,-641.748750],[-165.842500,-622.092500],[-144.296563,-601.000000],[-124.110000,-578.580000],[-93.840000,-538.580000],[-94.814219,-559.930605],[-97.593125,-582.091094],[-101.961094,-604.695723],[-107.702500,-627.378750],[-114.601719,-649.774434],[-122.443125,-671.517031],[-131.011094,-692.240801],[-140.090000,-711.580000]]);
  }
}

module rebelalliance(h)
{

poly_Selection(h);
}

rebelalliance(4);
